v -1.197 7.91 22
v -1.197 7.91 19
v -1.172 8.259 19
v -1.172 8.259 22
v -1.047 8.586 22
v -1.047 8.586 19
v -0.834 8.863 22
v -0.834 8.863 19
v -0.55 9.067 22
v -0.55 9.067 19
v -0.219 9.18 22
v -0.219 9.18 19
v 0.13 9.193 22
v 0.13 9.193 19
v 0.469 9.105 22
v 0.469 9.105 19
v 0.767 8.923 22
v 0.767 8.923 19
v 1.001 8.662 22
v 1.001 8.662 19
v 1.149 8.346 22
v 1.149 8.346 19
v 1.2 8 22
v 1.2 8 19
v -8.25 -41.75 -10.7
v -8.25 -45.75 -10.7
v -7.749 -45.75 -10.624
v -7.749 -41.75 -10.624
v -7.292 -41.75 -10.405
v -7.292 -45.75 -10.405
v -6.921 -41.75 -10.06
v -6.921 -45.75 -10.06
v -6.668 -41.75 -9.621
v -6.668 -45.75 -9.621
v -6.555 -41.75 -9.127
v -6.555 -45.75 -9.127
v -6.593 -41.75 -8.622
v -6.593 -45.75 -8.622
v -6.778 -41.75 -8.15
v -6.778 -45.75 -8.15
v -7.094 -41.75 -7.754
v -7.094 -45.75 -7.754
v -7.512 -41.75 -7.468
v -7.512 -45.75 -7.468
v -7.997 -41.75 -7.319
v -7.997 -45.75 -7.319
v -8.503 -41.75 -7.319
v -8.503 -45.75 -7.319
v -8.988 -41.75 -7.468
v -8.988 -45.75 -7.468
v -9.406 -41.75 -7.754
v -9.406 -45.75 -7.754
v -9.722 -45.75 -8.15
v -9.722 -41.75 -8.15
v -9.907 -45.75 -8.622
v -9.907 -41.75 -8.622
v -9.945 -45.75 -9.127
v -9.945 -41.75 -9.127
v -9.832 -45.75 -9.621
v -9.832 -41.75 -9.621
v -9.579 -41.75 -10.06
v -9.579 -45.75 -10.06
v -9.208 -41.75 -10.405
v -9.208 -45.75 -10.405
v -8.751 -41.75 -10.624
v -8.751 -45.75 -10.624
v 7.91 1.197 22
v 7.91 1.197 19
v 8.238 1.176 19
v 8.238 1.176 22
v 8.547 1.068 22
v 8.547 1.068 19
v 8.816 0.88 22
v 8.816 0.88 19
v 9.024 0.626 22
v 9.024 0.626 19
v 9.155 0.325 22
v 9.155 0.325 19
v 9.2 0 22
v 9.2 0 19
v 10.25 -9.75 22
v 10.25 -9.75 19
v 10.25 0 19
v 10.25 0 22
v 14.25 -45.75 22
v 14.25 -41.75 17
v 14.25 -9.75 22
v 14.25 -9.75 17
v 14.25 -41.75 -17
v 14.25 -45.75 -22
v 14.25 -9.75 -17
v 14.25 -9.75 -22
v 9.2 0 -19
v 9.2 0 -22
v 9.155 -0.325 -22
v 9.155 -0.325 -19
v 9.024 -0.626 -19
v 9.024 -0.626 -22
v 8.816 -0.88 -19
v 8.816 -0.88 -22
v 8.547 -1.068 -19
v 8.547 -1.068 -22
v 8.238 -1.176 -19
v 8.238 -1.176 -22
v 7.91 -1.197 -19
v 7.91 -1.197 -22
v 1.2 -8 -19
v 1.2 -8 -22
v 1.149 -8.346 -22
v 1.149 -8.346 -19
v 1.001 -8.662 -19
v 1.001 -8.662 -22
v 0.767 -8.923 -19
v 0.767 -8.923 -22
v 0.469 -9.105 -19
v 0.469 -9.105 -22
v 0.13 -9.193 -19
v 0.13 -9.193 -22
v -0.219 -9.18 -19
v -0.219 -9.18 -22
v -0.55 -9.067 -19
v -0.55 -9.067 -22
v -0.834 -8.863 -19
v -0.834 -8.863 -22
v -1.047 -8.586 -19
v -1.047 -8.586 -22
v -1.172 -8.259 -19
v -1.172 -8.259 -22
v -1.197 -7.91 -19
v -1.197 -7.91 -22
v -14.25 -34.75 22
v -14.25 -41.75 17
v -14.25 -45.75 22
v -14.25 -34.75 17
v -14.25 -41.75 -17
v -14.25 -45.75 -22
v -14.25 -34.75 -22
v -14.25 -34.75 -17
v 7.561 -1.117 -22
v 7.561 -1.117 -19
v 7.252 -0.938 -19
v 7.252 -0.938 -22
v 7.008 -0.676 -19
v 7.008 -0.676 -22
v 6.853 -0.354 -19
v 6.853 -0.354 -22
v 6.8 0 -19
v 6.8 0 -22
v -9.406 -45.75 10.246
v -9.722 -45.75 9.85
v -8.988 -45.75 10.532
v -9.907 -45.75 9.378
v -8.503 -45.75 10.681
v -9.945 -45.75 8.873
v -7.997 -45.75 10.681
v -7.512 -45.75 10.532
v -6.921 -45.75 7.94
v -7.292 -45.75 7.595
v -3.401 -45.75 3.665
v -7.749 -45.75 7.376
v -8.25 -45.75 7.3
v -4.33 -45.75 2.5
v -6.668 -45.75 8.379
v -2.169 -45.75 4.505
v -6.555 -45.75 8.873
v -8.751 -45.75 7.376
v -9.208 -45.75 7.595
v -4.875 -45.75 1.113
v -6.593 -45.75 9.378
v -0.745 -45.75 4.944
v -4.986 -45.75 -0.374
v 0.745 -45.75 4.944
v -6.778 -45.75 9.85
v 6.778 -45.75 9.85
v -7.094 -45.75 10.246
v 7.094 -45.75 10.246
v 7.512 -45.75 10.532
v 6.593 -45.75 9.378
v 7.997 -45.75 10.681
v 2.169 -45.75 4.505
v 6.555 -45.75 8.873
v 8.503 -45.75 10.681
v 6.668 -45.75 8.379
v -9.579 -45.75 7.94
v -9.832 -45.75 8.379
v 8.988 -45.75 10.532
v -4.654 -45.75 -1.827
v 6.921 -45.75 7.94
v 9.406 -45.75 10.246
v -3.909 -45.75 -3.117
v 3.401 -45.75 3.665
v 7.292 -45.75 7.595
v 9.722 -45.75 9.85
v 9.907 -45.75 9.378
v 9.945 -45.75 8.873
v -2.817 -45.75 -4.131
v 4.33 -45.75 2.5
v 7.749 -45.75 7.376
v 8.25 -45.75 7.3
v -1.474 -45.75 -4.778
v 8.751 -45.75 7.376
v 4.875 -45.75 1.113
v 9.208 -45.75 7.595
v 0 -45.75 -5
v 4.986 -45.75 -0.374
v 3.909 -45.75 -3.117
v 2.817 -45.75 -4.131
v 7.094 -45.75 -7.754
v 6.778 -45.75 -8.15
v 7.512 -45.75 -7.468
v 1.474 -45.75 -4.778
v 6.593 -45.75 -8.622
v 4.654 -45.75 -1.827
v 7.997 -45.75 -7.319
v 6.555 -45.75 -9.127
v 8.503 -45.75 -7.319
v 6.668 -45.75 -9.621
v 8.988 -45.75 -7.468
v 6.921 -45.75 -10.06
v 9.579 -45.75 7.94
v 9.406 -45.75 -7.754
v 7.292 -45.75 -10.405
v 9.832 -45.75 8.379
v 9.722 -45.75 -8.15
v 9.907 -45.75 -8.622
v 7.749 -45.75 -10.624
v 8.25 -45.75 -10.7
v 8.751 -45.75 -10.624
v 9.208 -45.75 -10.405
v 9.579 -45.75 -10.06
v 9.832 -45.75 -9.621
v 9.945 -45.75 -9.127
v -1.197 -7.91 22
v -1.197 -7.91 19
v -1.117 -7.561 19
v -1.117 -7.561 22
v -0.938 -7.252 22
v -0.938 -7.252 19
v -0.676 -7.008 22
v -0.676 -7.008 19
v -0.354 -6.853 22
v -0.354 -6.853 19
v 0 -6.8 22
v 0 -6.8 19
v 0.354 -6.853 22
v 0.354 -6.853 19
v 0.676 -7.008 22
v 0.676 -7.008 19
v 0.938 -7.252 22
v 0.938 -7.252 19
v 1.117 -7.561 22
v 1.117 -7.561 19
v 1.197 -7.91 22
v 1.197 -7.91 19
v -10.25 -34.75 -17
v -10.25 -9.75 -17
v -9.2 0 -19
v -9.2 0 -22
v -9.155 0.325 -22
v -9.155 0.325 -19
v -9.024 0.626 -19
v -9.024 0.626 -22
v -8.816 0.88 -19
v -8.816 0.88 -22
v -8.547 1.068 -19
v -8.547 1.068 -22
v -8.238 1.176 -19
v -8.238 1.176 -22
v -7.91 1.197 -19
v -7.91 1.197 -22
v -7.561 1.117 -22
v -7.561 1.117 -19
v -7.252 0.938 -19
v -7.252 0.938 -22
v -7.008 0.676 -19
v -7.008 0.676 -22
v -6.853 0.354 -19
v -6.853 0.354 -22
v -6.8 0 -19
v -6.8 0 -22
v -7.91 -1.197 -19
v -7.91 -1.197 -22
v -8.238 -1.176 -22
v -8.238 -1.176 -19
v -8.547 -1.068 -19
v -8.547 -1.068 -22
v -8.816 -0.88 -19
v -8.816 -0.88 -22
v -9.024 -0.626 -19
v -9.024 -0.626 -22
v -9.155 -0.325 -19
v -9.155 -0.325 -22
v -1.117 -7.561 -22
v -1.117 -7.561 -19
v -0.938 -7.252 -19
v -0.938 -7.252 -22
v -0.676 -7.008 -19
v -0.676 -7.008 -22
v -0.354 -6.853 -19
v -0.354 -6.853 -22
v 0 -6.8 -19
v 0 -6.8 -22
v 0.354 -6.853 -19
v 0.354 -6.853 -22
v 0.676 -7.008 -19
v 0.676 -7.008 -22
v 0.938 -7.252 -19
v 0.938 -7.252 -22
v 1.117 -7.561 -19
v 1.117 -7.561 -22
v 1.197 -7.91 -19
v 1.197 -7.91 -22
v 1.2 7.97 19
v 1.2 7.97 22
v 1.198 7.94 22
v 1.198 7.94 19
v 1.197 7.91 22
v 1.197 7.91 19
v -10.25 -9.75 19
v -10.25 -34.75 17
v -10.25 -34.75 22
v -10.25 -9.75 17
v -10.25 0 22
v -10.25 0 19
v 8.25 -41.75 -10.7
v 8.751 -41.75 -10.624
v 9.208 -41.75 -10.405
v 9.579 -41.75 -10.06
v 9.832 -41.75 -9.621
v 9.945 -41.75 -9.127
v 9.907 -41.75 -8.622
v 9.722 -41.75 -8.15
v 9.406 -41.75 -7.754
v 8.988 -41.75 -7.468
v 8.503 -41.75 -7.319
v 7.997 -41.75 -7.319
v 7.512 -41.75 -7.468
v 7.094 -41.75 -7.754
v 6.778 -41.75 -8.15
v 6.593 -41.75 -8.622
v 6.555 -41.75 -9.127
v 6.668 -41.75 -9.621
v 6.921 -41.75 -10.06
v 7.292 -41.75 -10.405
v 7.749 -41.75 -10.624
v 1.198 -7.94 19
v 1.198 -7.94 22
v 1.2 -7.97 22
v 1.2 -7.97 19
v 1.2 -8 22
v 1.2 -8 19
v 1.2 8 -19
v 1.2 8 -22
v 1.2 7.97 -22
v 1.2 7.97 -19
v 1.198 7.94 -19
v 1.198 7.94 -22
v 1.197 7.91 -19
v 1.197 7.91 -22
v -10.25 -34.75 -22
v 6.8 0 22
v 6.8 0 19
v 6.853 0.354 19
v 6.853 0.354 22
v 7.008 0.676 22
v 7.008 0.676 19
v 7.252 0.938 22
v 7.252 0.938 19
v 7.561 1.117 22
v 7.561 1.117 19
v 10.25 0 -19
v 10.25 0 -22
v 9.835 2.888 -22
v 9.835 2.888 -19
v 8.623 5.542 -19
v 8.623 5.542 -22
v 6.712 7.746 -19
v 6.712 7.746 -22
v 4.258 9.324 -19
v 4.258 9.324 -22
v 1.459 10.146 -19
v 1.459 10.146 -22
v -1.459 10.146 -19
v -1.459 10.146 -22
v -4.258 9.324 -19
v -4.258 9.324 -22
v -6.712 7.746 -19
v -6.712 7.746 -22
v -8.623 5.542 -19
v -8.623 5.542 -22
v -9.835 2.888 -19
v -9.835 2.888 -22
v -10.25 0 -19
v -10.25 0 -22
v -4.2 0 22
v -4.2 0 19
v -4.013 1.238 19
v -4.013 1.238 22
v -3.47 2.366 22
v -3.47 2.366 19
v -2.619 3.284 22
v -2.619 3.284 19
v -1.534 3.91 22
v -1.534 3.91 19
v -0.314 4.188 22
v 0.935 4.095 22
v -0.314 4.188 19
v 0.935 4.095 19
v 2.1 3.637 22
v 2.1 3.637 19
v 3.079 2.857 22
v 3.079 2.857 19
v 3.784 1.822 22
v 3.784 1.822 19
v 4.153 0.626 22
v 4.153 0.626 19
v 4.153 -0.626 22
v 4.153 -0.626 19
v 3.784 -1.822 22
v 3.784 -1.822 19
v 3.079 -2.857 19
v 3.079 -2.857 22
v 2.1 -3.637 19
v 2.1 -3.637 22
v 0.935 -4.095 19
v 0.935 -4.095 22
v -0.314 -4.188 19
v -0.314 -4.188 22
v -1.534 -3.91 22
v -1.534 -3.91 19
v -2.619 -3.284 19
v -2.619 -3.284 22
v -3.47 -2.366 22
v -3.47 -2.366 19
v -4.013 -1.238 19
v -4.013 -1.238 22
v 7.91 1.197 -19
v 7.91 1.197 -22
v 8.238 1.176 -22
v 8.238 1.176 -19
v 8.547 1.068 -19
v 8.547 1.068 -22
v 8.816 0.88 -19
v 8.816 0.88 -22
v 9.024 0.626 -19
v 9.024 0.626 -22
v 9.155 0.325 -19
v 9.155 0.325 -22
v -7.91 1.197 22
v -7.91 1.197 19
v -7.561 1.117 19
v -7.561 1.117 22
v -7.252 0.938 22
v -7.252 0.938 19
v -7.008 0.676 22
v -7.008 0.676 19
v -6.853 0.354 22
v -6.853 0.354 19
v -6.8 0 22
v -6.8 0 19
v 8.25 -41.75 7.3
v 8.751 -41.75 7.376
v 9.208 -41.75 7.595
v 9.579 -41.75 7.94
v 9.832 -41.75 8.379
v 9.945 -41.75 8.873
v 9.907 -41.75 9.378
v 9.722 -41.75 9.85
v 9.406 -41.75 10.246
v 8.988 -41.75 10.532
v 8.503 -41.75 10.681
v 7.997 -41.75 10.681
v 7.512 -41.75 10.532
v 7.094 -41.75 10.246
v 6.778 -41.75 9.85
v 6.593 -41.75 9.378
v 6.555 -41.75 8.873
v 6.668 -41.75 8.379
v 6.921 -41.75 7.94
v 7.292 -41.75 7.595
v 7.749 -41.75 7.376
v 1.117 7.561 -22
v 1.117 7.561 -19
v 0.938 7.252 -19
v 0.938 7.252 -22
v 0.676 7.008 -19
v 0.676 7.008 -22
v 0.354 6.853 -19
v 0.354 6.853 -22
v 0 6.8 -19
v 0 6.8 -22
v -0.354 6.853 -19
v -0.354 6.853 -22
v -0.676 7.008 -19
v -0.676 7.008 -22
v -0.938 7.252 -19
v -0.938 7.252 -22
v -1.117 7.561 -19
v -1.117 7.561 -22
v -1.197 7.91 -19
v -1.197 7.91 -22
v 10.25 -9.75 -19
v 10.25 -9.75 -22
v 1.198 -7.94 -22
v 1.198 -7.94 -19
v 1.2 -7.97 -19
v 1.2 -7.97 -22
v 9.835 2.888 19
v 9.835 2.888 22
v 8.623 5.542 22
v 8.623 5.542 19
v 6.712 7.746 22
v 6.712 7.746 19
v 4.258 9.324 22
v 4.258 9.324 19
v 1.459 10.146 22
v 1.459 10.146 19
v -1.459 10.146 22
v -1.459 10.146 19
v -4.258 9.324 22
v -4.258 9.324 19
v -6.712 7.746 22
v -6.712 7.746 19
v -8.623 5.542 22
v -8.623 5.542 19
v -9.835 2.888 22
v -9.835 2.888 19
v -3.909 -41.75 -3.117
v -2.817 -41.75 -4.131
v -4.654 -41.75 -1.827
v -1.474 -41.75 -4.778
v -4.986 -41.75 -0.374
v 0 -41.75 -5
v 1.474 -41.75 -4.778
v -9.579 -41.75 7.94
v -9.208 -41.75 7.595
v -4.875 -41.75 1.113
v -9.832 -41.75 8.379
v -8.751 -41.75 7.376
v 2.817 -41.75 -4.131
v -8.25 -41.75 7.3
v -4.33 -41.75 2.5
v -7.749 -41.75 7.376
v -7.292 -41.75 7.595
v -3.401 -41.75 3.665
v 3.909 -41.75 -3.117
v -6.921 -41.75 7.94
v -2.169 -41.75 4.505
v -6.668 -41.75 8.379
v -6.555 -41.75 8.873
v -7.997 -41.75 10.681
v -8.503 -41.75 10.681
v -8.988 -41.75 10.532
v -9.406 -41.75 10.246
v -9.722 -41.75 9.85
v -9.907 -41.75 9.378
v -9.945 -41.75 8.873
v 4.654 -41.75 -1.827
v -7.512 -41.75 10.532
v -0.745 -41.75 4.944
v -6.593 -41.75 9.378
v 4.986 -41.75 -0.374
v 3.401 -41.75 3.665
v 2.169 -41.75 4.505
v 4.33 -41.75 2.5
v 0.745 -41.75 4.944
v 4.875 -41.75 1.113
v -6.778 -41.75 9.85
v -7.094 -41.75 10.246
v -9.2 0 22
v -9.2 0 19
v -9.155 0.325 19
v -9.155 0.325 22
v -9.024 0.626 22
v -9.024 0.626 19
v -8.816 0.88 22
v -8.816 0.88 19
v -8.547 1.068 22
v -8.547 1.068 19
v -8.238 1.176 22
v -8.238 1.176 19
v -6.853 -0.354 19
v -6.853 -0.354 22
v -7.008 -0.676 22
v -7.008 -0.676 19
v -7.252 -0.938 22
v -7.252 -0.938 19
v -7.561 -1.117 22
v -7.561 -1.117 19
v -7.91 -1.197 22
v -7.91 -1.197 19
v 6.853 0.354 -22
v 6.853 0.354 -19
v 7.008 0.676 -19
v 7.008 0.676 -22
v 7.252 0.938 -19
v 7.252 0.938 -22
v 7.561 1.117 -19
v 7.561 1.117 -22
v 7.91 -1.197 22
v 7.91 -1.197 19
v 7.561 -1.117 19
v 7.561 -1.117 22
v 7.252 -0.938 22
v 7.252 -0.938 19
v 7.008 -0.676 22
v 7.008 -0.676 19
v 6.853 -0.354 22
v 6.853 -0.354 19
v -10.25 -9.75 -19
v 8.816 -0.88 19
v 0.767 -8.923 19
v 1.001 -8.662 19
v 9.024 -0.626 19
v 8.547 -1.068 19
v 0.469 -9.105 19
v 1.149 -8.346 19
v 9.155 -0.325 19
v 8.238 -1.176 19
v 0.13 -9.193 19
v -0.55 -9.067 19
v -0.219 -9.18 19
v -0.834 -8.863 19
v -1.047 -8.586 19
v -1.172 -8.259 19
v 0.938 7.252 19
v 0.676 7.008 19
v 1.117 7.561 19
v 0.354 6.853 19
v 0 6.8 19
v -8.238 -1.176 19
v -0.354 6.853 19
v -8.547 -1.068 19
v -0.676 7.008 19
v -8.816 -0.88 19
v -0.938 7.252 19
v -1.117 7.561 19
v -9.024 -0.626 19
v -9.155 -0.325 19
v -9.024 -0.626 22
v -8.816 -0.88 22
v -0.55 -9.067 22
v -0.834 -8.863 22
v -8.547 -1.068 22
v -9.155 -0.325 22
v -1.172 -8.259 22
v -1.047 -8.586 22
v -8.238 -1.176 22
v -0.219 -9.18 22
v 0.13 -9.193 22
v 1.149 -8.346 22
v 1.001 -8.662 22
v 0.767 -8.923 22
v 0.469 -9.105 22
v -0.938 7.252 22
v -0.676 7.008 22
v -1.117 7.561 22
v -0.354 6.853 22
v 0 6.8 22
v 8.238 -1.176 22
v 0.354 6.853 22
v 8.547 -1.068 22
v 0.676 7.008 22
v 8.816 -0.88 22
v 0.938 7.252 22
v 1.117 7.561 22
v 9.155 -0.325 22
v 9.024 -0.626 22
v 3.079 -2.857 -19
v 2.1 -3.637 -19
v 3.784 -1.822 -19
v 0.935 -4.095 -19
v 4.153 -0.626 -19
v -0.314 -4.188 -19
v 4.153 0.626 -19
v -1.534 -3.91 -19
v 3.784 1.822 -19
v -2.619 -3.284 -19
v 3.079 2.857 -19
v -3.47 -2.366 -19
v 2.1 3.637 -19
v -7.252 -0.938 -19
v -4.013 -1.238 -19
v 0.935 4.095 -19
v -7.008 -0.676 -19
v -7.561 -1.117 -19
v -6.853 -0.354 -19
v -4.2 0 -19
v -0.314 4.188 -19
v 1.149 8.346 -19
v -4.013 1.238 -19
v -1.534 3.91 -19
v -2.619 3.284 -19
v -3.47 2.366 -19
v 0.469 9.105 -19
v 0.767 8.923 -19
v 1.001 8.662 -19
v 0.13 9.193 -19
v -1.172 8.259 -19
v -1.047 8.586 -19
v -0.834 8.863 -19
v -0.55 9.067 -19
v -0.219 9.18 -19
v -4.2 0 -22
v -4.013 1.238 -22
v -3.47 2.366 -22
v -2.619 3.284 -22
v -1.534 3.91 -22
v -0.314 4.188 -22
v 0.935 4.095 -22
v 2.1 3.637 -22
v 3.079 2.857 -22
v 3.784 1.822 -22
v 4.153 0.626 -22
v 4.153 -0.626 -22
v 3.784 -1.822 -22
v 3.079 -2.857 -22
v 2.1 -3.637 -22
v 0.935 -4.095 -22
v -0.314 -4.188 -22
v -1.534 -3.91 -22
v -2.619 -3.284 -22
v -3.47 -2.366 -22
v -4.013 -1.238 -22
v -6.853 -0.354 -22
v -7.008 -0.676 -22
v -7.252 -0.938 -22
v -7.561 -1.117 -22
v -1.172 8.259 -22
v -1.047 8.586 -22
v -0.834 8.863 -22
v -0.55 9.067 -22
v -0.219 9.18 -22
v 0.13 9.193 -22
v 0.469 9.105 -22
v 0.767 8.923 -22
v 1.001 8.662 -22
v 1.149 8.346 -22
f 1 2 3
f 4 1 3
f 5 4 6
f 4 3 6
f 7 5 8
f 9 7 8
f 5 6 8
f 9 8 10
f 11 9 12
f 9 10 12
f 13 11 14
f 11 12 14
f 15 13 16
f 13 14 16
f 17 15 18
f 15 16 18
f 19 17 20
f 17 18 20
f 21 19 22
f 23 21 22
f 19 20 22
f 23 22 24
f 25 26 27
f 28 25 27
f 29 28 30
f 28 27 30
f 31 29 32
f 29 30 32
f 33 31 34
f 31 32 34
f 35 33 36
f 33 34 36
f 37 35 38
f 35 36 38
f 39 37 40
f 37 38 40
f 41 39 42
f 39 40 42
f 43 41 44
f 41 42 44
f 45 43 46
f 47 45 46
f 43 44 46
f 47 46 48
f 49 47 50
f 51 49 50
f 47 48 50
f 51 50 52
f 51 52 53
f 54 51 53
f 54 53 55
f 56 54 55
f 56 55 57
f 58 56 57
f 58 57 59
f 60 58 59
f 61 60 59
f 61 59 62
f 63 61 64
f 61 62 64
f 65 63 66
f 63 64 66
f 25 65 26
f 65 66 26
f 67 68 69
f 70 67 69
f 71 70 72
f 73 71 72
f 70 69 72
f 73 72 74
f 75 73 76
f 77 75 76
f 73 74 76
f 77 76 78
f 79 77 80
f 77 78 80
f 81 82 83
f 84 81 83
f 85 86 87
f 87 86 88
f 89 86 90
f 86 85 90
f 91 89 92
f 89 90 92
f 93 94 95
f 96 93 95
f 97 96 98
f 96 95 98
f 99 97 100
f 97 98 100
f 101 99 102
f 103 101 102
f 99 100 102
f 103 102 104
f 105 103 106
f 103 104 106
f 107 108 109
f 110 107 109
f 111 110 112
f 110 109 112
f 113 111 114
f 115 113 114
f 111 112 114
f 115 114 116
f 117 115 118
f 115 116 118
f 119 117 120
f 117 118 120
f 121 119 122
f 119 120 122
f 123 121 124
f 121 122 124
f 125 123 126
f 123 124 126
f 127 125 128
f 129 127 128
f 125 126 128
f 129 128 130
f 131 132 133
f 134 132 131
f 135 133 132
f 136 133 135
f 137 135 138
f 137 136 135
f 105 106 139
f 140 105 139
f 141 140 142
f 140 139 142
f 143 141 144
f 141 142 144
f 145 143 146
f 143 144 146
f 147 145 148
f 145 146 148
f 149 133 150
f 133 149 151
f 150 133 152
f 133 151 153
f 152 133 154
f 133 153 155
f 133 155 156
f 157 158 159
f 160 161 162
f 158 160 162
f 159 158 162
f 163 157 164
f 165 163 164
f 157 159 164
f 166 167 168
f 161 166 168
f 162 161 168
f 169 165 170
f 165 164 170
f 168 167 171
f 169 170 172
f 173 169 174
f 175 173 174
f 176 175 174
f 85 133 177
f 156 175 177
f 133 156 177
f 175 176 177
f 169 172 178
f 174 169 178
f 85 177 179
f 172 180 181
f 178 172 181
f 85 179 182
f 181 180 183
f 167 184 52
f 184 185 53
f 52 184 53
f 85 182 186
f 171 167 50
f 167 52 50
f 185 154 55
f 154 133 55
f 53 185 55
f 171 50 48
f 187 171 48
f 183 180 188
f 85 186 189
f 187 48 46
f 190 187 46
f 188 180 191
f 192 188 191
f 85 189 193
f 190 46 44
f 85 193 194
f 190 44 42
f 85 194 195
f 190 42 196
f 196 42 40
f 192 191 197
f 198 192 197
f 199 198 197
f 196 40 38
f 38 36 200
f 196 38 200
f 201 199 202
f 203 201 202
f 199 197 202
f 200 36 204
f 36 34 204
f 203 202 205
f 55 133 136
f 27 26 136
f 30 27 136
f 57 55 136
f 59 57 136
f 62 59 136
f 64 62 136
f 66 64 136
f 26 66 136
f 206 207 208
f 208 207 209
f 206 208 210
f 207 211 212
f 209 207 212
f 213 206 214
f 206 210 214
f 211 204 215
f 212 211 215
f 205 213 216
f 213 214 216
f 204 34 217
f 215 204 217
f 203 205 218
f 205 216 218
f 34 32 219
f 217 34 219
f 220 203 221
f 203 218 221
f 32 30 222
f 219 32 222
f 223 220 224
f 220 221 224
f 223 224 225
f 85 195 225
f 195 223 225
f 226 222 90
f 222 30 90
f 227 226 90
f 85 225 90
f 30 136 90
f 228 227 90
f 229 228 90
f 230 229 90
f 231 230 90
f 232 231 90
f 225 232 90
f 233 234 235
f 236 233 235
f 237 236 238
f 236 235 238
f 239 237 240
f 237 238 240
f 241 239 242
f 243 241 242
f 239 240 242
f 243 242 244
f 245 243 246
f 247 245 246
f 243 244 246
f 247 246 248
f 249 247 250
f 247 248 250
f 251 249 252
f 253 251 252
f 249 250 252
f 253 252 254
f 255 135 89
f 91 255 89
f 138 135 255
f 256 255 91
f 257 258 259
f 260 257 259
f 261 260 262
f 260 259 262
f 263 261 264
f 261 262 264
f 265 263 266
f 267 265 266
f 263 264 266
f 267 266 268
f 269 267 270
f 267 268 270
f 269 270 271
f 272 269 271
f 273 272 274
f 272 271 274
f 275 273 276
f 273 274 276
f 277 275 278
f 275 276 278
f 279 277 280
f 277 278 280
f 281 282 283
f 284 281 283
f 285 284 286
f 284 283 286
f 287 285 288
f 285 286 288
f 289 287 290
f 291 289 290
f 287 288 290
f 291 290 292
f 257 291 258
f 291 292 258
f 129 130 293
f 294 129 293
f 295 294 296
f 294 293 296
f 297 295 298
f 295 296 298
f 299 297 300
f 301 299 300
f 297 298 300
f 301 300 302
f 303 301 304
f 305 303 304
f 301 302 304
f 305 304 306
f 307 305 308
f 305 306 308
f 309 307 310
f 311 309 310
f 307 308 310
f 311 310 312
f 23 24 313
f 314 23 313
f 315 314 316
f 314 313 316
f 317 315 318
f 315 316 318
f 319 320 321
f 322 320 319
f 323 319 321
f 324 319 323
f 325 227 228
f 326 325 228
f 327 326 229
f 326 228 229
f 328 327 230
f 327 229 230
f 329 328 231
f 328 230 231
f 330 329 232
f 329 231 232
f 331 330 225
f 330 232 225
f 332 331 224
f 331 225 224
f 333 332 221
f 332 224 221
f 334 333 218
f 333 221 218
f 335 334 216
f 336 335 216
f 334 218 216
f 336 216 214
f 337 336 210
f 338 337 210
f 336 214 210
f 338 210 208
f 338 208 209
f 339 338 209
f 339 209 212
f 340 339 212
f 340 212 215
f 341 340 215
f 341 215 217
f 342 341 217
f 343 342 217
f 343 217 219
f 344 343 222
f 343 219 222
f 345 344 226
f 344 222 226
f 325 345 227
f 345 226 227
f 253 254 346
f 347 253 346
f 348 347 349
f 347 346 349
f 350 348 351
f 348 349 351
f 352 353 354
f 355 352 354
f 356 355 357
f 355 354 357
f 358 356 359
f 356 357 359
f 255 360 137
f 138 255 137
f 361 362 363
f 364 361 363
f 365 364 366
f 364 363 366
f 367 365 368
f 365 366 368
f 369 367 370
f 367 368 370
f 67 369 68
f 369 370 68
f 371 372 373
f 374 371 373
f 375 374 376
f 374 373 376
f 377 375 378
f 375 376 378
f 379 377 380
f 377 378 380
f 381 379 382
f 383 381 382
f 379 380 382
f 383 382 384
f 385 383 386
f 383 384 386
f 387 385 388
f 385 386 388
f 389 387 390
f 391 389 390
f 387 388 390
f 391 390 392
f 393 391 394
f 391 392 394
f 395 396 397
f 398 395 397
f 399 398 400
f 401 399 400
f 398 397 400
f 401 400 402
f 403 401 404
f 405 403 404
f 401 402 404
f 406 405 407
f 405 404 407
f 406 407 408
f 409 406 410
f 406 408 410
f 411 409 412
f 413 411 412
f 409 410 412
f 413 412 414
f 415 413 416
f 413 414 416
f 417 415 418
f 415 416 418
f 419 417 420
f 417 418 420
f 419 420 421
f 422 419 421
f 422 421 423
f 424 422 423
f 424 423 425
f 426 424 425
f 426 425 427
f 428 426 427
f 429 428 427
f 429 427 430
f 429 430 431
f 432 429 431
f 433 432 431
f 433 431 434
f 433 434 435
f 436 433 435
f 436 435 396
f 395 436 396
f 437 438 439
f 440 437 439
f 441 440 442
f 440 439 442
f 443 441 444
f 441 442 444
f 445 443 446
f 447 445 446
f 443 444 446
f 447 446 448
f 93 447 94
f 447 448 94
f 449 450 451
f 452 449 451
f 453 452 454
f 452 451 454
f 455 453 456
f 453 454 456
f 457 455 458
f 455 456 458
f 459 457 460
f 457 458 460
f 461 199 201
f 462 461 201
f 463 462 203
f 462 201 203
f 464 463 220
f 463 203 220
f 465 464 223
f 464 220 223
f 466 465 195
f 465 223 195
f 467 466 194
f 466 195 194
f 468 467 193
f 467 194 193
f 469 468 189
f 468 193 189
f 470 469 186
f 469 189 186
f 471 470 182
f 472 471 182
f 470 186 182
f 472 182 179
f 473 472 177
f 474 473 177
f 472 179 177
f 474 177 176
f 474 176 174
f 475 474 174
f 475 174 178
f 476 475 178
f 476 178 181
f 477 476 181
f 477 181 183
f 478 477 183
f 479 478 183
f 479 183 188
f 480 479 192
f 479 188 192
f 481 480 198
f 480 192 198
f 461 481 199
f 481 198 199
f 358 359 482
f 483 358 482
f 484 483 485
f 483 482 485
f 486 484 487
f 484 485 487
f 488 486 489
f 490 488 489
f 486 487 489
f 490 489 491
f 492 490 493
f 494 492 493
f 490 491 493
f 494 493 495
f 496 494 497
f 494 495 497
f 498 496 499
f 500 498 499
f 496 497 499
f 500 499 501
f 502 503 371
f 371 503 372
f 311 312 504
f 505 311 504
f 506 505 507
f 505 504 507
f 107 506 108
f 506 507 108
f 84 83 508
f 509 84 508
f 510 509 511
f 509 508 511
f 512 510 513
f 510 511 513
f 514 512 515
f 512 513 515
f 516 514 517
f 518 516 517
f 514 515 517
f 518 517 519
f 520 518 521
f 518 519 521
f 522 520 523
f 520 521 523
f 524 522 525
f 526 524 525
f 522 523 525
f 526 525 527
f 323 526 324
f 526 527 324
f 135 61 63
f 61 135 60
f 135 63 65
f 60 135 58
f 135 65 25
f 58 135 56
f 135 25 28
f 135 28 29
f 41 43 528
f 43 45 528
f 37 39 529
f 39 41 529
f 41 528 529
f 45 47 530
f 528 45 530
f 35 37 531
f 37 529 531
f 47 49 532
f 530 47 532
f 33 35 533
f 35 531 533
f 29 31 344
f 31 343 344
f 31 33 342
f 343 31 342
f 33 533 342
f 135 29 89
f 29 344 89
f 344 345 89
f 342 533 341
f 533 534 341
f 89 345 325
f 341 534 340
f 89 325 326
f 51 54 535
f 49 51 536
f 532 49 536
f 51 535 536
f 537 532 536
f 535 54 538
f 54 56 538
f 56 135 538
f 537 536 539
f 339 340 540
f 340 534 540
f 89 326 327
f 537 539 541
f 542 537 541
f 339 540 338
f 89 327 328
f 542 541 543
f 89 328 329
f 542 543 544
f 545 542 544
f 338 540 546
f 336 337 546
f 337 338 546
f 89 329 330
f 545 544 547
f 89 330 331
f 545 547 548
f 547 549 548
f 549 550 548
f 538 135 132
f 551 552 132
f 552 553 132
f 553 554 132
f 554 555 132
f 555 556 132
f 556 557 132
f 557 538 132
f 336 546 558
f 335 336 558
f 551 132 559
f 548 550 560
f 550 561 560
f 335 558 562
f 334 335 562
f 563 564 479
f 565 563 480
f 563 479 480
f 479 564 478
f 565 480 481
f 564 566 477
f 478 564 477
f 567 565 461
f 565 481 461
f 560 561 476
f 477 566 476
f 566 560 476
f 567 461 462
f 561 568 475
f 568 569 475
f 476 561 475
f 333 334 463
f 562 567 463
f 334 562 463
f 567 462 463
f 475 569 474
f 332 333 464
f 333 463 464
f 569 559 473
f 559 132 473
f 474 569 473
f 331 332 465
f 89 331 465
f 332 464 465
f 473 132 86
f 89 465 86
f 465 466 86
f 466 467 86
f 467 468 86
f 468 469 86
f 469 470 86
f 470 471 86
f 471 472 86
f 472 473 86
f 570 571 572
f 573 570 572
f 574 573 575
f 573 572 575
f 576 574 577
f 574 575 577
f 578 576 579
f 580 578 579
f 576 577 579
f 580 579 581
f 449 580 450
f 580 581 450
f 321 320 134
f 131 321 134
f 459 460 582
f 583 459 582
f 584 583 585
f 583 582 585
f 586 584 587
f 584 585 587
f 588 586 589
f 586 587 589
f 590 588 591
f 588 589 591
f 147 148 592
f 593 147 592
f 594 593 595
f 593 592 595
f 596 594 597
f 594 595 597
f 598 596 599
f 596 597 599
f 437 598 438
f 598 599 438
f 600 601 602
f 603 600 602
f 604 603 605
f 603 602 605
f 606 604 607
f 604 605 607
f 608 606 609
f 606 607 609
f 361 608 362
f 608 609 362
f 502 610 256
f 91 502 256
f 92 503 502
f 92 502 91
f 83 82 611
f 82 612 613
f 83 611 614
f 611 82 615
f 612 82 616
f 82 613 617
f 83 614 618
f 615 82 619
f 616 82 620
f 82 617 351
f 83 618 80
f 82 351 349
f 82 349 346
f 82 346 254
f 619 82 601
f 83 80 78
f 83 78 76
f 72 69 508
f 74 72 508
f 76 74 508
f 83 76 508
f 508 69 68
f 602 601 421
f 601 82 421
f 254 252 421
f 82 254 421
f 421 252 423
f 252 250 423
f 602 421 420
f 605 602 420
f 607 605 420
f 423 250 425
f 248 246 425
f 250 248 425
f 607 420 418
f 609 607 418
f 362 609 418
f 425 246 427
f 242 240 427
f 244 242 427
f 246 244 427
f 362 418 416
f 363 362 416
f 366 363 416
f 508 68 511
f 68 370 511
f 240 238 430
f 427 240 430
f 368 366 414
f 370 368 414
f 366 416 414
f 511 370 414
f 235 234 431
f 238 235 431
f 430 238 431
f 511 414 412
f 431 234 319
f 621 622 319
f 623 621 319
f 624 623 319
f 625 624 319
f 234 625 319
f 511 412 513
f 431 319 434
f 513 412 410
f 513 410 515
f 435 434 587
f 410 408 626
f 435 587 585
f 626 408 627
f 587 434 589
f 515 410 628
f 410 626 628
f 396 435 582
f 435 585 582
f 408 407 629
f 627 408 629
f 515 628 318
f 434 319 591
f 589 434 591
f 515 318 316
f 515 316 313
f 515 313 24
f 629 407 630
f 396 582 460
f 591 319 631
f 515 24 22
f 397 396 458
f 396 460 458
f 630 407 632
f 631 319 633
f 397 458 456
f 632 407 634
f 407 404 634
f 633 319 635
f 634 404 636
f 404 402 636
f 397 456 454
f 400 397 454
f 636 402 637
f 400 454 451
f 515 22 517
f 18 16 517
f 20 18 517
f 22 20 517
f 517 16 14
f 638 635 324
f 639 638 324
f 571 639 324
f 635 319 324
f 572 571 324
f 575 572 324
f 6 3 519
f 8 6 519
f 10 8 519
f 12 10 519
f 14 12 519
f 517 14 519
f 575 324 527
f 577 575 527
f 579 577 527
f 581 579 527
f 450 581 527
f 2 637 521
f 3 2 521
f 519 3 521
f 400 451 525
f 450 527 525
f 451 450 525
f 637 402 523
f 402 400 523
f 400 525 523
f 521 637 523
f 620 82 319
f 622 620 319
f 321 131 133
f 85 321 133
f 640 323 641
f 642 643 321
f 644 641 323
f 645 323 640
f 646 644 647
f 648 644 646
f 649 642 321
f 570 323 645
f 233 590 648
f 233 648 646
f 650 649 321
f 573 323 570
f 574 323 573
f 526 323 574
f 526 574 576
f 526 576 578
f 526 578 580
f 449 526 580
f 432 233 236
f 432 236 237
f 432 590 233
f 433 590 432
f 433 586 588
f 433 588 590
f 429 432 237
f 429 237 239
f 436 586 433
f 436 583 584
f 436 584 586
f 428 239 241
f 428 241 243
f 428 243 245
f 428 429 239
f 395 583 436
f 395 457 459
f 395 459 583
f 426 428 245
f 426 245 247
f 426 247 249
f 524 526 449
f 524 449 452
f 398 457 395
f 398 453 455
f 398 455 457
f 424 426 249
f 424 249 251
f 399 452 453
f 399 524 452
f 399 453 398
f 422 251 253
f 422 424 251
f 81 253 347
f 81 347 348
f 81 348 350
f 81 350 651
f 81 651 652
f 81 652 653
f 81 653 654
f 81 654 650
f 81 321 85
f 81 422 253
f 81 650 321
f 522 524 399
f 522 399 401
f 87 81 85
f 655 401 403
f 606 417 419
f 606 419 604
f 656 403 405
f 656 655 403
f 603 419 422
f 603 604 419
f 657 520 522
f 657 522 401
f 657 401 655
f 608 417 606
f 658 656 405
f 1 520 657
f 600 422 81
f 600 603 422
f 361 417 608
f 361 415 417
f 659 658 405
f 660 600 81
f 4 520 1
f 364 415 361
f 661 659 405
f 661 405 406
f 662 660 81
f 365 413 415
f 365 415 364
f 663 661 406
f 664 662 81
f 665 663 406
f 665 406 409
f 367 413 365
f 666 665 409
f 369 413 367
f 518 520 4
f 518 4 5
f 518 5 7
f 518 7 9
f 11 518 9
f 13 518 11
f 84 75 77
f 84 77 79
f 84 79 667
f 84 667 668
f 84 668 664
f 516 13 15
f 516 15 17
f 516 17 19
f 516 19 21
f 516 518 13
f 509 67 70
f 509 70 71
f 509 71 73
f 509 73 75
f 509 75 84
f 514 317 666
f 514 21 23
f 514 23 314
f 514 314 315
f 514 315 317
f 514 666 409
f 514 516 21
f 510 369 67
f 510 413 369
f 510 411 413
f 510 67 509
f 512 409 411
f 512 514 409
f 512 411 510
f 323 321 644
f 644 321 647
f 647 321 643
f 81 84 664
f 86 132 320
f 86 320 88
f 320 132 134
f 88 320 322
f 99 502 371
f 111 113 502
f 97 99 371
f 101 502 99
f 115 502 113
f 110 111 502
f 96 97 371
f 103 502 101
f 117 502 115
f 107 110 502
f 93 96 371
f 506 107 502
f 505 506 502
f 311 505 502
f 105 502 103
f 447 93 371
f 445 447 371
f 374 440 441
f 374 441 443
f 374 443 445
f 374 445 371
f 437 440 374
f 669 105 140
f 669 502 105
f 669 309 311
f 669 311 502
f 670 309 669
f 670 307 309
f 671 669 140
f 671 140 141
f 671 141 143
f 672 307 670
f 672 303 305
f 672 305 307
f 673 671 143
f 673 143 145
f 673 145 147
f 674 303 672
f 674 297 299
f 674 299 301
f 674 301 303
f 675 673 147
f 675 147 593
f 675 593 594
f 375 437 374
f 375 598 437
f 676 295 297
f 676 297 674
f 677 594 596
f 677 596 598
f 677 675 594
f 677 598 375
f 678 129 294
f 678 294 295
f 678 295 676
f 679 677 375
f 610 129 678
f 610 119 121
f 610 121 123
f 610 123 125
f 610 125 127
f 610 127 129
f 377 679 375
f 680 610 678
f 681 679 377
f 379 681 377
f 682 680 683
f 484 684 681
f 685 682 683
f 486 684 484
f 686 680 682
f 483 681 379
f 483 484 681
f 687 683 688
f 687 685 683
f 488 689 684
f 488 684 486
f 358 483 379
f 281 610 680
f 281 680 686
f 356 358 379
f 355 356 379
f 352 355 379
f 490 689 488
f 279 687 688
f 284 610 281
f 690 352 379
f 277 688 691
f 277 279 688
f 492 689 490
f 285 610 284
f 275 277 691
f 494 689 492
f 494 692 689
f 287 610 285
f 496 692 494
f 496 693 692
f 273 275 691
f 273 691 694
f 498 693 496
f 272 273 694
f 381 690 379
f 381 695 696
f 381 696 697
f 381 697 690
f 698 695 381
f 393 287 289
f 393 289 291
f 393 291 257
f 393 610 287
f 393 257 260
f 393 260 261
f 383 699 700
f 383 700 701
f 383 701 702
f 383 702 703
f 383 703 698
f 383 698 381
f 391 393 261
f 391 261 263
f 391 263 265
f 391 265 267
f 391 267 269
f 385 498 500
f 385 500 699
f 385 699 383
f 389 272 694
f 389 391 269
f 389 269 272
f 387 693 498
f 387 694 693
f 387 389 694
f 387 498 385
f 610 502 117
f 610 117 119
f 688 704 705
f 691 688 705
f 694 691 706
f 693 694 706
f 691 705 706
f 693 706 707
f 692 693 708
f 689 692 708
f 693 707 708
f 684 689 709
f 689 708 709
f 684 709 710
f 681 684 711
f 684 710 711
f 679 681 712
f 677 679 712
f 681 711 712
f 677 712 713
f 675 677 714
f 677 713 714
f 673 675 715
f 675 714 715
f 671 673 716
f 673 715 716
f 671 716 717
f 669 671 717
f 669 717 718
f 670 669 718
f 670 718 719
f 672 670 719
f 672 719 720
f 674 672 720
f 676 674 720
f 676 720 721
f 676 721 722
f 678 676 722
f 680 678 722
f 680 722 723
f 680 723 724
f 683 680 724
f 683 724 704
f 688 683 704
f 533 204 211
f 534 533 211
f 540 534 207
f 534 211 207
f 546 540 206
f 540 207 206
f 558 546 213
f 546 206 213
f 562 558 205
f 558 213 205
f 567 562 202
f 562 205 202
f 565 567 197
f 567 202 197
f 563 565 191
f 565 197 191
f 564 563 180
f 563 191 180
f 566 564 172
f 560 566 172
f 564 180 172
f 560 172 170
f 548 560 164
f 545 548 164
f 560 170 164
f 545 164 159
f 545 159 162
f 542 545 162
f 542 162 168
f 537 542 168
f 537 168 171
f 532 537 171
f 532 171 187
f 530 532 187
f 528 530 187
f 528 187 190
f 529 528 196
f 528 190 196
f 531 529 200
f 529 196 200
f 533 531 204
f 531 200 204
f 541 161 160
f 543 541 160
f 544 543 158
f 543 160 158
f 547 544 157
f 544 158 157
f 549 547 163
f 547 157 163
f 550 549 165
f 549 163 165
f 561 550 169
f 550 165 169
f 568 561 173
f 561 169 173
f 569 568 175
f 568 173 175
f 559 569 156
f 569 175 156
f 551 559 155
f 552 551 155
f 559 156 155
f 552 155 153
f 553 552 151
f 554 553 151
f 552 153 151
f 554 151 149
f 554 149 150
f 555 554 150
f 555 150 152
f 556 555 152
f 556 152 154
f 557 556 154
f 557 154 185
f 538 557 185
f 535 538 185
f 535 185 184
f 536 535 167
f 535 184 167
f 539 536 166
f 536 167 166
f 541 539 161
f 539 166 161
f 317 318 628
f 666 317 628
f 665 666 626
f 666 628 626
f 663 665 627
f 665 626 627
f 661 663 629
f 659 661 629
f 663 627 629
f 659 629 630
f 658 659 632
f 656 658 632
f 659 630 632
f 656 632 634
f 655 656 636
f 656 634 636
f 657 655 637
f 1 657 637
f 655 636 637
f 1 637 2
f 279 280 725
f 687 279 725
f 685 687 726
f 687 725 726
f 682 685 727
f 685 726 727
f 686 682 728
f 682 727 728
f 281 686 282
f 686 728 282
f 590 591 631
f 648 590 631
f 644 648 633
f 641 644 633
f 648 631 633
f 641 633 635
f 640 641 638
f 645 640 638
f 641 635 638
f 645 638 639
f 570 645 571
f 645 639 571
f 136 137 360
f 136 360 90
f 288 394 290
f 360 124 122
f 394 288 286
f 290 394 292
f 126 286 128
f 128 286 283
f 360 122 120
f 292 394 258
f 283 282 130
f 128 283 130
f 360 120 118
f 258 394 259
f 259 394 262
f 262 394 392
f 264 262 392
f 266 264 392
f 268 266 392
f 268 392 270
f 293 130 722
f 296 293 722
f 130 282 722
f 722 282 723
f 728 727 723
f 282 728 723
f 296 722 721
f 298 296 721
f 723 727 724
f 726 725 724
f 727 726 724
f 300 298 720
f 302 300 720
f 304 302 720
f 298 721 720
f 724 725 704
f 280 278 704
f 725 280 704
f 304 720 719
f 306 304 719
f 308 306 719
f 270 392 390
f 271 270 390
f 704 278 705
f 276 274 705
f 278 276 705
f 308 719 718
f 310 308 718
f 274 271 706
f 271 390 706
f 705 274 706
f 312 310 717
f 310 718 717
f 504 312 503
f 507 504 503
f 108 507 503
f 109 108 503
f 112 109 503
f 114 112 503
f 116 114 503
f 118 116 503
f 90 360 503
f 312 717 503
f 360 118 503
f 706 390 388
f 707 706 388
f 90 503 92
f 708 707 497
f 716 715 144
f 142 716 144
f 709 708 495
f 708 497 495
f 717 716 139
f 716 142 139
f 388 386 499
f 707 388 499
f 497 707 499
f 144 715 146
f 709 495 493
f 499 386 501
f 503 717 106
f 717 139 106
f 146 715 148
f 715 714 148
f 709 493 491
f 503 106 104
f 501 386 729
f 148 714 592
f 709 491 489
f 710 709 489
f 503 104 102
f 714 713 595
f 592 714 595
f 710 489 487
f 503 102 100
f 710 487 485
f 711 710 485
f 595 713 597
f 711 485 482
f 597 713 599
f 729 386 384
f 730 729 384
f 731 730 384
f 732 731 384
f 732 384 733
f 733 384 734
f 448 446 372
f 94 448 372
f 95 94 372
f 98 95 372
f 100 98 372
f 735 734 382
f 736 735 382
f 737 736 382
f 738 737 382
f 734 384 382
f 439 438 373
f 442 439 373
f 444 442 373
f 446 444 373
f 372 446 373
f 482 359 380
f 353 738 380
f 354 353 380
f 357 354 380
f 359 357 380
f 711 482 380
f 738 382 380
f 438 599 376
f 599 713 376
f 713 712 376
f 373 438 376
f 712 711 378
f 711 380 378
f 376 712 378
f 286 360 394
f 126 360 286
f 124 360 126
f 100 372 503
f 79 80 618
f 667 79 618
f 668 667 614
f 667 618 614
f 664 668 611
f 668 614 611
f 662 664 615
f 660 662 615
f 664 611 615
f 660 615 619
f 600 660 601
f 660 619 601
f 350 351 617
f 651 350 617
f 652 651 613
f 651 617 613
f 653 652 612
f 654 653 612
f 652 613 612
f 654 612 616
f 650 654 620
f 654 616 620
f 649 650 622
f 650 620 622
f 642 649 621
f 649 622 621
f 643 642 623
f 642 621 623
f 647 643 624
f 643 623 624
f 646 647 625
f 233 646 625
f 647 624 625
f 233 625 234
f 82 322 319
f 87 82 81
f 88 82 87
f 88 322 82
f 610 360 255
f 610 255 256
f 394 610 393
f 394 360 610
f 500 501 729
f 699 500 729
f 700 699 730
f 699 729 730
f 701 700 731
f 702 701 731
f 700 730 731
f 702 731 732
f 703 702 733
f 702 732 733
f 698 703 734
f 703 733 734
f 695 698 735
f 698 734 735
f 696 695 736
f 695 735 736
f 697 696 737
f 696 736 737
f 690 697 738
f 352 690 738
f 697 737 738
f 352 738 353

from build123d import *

# Parameters (mm, degrees)
BOSS_EXTRUDE1_DEPTH      = 22
BOSS_EXTRUDE1_DEPTH_BACK = 22
SKETCH1_R                = 1.2
SKETCH1_R_2              = 4.2
SKETCH2_W                = 38
SKETCH2_H                = 20
CUT_EXTRUDE1_DEPTH       = 105.423416914
SKETCH3_W                = 7
SKETCH3_H                = 44
BOSS_EXTRUDE2_DEPTH      = 36
SKETCH5_W                = 34
SKETCH5_H                = 50
CUT_EXTRUDE3_DEPTH       = 109.047443283
SKETCH6_W                = 20.5
SKETCH6_H                = 54.25
CUT_EXTRUDE4_DEPTH       = 111.605436123
SKETCH20_W               = 28.5
SKETCH20_H               = 34
SKETCH20_R               = 1.7
SKETCH20_R_2             = 5
BOSS_EXTRUDE5_DEPTH      = 4
SKETCH21_W               = 3
SKETCH21_H               = 36
CUT_EXTRUDE12_DEPTH      = 66.777085676
SKETCH22_W               = 4
SKETCH22_H               = 25
CUT_EXTRUDE14_DEPTH      = 66.054784605


with BuildPart() as part:
    # Sketch1 → Boss-Extrude1 (new, two sides: drawn at the far end of the back side and taken through both)
    with BuildSketch(Plane.XY.offset(-BOSS_EXTRUDE1_DEPTH_BACK)):
        with BuildLine():
            ThreePointArc((10.25, 0), (0, 10.25), (-10.25, 0))
            Line((-10.25, 0), (-10.25, -100))
            Line((-10.25, -100), (10.25, -100))
            Line((10.25, -100), (10.25, 0))
        make_face()
        with Locations((8, 0)):
            Circle(SKETCH1_R, mode=Mode.SUBTRACT)
        with Locations((0, 8)):
            Circle(SKETCH1_R, mode=Mode.SUBTRACT)
        with Locations((-8, 0)):
            Circle(SKETCH1_R, mode=Mode.SUBTRACT)
        Circle(SKETCH1_R_2, mode=Mode.SUBTRACT)
        with Locations((0, -8)):
            Circle(SKETCH1_R, mode=Mode.SUBTRACT)
    extrude(amount=BOSS_EXTRUDE1_DEPTH + BOSS_EXTRUDE1_DEPTH_BACK)

    # Sketch2 → Cut-Extrude1 (cut, through all)
    with BuildSketch(Plane.ZY.offset(10.25)):
        with Locations((0, 0.25)):
            Rectangle(SKETCH2_W, SKETCH2_H)
    extrude(amount=-CUT_EXTRUDE1_DEPTH, mode=Mode.SUBTRACT)

    # Sketch3 → Boss-Extrude2 (add)
    with BuildSketch(Plane(origin=(0, -9.75, 0), x_dir=(1, 0, 0), z_dir=(0, 1, 0))):
        with Locations((-13.75, 0)):
            Rectangle(SKETCH3_W, SKETCH3_H)
        with Locations((13.75, 0)):
            Rectangle(SKETCH3_W, SKETCH3_H)
    extrude(amount=-BOSS_EXTRUDE2_DEPTH)

    # Sketch5 → Cut-Extrude3 (cut, through all)
    with BuildSketch(Plane.ZY.offset(17.25)):
        with Locations((0, -34.75)):
            Rectangle(SKETCH5_W, SKETCH5_H)
    extrude(amount=-CUT_EXTRUDE3_DEPTH, mode=Mode.SUBTRACT)

    # Sketch6 → Cut-Extrude4 (cut, through all)
    with BuildSketch(Plane.XY.offset(22)):
        with Locations((0, -72.875)):
            Rectangle(SKETCH6_W, SKETCH6_H)
    extrude(amount=-CUT_EXTRUDE4_DEPTH, mode=Mode.SUBTRACT)


with BuildPart() as cut_extrude4_piece_1:
    # of the separate pieces the step leaves, piece 1, a body of its own (cut_extrude4_pieces)
    add(part.part.solids().sort_by_distance((17.25, -45.75, -17))[0])



with BuildPart() as cut_extrude4_piece_2:
    # of the separate pieces the step leaves, piece 2, a body of its own (cut_extrude4_pieces)
    add(part.part.solids().sort_by_distance((-10.25, 0, 22))[0])


with BuildPart() as cut_extrude4_piece_1_1:
    add(cut_extrude4_piece_1.part)

    add(cut_extrude4_piece_2.part)  # Boss-Extrude5 merges Cut-Extrude4 piece 2
    # Sketch20 → Boss-Extrude5 (add)
    with BuildSketch(Plane.XZ.offset(45.75)):
        Rectangle(SKETCH20_W, SKETCH20_H)
        with Locations((-8.25, -9)):
            Circle(SKETCH20_R, mode=Mode.SUBTRACT)
        with Locations((8.25, -9)):
            Circle(SKETCH20_R, mode=Mode.SUBTRACT)
        with Locations((-8.25, 9)):
            Circle(SKETCH20_R, mode=Mode.SUBTRACT)
        Circle(SKETCH20_R_2, mode=Mode.SUBTRACT)
        with Locations((8.25, 9)):
            Circle(SKETCH20_R, mode=Mode.SUBTRACT)
    extrude(amount=-BOSS_EXTRUDE5_DEPTH)

    # Sketch21 → Cut-Extrude12 (cut, through all)
    with BuildSketch(Plane(origin=(0, 0, -22), x_dir=(-1, 0, 0), z_dir=(0, 0, -1))):
        with Locations((-15.75, -27.75)):
            Rectangle(SKETCH21_W, SKETCH21_H)
        with Locations((15.75, -27.75)):
            Rectangle(SKETCH21_W, SKETCH21_H)
    extrude(amount=-CUT_EXTRUDE12_DEPTH, mode=Mode.SUBTRACT)

    # Sketch22 → Cut-Extrude14 (cut, through all)
    with BuildSketch(Plane(origin=(0, 0, -22), x_dir=(-1, 0, 0), z_dir=(0, 0, -1))):
        with Locations((12.25, -22.25)):
            Rectangle(SKETCH22_W, SKETCH22_H)
    extrude(amount=-CUT_EXTRUDE14_DEPTH, mode=Mode.SUBTRACT)


solid = cut_extrude4_piece_1_1.part
